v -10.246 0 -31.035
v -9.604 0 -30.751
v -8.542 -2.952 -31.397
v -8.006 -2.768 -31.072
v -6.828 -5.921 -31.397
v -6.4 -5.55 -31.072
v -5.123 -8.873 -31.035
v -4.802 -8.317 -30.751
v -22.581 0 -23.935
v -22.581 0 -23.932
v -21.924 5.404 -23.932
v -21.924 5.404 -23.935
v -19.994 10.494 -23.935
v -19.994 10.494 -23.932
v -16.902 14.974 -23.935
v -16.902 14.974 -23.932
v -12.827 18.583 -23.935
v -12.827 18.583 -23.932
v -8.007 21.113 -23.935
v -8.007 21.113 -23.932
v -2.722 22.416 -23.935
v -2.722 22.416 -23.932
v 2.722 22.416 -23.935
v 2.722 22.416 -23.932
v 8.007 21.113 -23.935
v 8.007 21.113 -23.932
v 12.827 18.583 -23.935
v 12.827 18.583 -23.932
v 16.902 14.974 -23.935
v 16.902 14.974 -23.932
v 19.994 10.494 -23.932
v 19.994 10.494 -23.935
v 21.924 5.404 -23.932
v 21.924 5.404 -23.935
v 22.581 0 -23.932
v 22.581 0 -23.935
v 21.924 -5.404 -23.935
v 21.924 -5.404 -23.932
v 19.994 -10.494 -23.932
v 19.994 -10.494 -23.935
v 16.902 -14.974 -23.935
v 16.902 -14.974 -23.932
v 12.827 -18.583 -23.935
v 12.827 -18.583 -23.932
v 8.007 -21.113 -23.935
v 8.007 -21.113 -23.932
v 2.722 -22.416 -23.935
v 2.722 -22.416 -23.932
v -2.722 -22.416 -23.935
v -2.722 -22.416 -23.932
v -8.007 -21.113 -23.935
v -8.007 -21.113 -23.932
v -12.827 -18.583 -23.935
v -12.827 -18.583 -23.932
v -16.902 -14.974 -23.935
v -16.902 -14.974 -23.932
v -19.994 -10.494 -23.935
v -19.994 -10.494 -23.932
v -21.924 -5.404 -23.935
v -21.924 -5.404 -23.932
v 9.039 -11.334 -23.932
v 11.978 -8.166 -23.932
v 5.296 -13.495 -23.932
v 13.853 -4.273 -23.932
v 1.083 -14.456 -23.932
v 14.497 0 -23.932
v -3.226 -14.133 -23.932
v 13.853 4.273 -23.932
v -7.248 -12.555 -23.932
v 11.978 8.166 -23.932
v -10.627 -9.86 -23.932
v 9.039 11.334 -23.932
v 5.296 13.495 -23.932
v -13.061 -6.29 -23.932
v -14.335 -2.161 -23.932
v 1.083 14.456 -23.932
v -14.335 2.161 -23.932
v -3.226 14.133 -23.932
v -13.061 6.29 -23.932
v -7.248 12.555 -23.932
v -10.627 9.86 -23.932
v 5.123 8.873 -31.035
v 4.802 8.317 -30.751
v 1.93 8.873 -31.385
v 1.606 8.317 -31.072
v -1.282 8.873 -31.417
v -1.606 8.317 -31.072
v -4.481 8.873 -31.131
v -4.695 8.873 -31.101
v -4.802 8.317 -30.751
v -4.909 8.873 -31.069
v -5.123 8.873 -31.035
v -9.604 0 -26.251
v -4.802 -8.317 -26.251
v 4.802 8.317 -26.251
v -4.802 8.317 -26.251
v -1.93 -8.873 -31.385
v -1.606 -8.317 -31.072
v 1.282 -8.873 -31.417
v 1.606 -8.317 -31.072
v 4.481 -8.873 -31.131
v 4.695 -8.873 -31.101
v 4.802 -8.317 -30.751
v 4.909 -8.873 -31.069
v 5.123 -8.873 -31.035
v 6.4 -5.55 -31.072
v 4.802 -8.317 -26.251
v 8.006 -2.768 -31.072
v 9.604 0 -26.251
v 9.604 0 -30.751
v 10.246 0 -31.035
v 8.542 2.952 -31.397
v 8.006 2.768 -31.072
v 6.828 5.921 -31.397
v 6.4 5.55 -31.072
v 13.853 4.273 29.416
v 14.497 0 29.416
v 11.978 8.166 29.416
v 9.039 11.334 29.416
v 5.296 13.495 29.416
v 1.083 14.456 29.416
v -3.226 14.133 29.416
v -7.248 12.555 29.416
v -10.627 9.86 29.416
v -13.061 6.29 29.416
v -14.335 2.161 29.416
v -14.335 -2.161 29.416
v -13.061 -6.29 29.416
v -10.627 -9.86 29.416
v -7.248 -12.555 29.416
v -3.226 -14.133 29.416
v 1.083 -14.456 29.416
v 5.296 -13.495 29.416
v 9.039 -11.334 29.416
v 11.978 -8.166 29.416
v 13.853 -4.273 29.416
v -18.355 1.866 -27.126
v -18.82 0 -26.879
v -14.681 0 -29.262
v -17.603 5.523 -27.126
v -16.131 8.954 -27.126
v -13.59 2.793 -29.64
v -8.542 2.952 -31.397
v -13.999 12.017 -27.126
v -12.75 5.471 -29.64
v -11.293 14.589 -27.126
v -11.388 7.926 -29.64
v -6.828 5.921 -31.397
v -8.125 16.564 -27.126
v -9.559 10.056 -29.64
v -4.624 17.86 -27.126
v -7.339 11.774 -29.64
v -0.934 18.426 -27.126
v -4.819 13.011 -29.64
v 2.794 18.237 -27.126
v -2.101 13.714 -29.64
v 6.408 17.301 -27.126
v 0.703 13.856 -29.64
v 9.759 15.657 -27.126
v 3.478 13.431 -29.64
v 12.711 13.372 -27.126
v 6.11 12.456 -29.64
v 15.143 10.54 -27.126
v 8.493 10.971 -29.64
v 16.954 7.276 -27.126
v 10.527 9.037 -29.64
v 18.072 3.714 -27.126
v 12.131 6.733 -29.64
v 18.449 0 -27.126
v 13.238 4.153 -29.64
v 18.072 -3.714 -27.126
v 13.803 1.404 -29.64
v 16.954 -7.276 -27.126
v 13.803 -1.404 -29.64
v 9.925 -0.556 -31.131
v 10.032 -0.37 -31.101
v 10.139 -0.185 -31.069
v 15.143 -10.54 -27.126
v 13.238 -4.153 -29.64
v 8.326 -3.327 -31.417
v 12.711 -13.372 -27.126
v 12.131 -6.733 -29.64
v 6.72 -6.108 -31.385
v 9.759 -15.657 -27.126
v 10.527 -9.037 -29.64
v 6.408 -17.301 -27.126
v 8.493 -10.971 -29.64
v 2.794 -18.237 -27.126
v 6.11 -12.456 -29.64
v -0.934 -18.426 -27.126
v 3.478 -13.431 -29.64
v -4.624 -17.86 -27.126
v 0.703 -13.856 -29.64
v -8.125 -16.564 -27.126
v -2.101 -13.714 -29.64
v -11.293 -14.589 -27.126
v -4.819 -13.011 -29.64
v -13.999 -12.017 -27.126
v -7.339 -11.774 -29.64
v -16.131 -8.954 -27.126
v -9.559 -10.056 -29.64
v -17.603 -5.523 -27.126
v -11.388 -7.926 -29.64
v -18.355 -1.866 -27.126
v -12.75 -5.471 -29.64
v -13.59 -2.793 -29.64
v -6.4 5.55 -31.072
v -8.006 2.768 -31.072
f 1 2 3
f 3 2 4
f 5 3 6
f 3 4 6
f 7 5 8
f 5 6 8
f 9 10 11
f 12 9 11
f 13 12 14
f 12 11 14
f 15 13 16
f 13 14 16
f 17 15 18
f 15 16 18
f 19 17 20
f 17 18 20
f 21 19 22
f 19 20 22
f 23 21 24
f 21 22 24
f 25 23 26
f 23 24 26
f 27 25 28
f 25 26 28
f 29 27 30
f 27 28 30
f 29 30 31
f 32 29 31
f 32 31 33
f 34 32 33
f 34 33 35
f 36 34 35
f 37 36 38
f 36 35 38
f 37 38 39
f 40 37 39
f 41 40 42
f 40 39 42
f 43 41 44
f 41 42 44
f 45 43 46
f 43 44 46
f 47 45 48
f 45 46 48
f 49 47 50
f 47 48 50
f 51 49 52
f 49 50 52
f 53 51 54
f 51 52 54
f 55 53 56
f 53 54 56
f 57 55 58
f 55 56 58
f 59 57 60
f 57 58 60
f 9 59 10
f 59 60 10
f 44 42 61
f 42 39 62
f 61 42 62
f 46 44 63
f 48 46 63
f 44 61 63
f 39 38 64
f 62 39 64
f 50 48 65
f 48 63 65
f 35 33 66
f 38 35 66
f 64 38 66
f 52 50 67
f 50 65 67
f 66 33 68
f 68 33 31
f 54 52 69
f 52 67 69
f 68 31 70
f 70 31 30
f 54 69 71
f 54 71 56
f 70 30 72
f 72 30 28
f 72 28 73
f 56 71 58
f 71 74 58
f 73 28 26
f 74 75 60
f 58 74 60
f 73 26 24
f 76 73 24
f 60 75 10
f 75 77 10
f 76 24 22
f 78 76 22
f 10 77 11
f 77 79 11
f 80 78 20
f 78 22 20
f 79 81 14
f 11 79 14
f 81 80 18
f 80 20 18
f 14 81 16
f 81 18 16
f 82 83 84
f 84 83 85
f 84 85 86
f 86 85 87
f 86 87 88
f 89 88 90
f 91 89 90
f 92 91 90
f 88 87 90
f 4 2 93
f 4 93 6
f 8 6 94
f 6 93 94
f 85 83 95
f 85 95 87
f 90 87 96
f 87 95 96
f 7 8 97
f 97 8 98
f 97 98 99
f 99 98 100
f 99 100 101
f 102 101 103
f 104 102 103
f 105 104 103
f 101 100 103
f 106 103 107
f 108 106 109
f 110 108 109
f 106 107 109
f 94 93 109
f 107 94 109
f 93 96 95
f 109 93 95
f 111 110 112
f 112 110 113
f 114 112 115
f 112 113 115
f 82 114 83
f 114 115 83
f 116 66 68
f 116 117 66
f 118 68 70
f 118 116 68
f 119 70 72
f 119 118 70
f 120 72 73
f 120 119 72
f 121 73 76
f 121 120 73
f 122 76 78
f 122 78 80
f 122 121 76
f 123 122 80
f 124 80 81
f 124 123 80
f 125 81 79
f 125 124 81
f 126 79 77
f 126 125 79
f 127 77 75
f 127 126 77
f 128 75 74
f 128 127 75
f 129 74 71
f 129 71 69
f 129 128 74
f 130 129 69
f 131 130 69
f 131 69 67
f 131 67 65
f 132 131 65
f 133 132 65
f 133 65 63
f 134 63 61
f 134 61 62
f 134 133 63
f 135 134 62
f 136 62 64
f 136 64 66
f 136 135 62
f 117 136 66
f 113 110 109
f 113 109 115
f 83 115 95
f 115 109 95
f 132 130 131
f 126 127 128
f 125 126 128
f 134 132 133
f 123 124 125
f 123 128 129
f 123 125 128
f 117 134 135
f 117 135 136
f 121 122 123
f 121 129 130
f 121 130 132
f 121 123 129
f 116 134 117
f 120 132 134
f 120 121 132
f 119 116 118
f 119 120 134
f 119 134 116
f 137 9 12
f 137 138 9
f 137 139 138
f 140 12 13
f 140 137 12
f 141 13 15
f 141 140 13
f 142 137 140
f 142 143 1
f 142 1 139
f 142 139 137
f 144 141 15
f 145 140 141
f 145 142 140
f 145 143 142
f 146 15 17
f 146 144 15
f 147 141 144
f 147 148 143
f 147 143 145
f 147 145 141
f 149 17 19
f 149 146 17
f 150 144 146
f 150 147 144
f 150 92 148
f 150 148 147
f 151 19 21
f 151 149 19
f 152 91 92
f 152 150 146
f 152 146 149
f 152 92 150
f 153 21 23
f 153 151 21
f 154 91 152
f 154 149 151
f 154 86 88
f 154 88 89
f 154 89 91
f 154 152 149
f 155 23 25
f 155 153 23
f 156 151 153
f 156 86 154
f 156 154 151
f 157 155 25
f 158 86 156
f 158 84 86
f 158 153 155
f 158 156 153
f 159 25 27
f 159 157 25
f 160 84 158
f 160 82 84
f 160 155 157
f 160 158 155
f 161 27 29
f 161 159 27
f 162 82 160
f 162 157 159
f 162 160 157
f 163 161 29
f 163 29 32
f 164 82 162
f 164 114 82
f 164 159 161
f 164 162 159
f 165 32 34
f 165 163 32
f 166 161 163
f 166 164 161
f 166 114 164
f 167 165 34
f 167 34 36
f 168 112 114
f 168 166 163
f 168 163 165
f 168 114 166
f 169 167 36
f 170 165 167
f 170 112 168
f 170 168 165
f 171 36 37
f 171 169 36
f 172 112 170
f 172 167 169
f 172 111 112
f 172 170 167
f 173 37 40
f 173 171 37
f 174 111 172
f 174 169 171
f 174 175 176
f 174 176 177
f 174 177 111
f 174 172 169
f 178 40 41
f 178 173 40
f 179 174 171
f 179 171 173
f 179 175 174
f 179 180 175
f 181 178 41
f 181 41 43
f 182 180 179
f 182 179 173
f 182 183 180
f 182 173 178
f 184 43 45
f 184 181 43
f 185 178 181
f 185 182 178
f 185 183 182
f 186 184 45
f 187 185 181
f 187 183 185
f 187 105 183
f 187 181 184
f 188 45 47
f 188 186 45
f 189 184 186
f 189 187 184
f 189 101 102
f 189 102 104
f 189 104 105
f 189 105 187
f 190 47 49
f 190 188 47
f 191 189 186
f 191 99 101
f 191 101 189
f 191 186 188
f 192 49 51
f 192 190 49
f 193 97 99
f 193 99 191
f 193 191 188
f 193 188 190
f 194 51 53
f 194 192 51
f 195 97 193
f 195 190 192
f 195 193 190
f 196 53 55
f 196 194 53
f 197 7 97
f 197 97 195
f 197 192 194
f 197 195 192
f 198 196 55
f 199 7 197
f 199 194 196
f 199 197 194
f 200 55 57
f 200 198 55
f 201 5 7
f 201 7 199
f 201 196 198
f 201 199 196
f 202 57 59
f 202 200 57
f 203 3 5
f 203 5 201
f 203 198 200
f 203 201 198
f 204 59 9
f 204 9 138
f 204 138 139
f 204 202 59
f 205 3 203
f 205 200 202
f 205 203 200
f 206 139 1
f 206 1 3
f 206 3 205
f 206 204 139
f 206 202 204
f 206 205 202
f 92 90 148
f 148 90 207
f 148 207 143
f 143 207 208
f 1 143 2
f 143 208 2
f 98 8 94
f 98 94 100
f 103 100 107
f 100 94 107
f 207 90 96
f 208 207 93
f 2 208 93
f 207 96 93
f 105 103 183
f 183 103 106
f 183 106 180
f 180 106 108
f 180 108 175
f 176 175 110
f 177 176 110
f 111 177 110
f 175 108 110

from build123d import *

# Parameters (mm, degrees)
SKETCH1_R           = 5
BOSS_EXTRUDE1_DEPTH = 9.2
SKETCH2_R           = 7.788167924
BOSS_EXTRUDE2_DEPTH = 0.001
DOME1_FACE_RADIUS   = 7.788167924
DOME1_HEIGHT        = 3
CUT_EXTRUDE1_START  = -10
CUT_EXTRUDE1_DEPTH  = 40
CHAMFER2_SIZE       = 0.16446068
SCALE1_SCALE        = 1.9329
SCALE2_SCALE        = 1.5


with BuildPart() as part:
    # Sketch1 → Boss-Extrude1 (new, symmetric)
    with BuildSketch(Plane.XY):
        Circle(SKETCH1_R)
    extrude(amount=BOSS_EXTRUDE1_DEPTH, both=True)

    # Sketch2 → Boss-Extrude2 (add)
    with BuildSketch(Plane(origin=(0, 0, -9.2), x_dir=(-1, 0, 0), z_dir=(0, 0, -1))):
        Circle(SKETCH2_R)
    extrude(amount=BOSS_EXTRUDE2_DEPTH)

    # Dome1: a dome of height H over a round flat face of radius A is a cap of a sphere of radius (A * A + H * H) / (2 * H)
    dome1_r = (DOME1_FACE_RADIUS * DOME1_FACE_RADIUS + DOME1_HEIGHT * DOME1_HEIGHT) / (2 * DOME1_HEIGHT)
    dome1_base = Plane((0, 0, -9.201), z_dir=(0, 0, -1))
    with Locations(dome1_base.offset(DOME1_HEIGHT - dome1_r)):
        dome1_ball = Sphere(dome1_r, mode=Mode.PRIVATE)
    add(split(dome1_ball, bisect_by=dome1_base, keep=Keep.TOP, mode=Mode.PRIVATE))

    # Sketch3 → Cut-Extrude1 (cut)
    with BuildSketch(Plane.XY.offset(CUT_EXTRUDE1_START)):
        Polygon((-3.312540498, 0), (-1.656270249, -2.868744223), (1.656270249, -2.868744223), (3.312540498, 0), (1.656270249, 2.868744223), (-1.656270249, 2.868744223), align=None)
    extrude(amount=-CUT_EXTRUDE1_DEPTH, mode=Mode.SUBTRACT)

    # Chamfer2
    # the kernel refuses this chamfer: 0.2, 0.16446068 mm, written as the material it takes off along each edge
    with BuildSketch(Plane(origin=(-2.484405374, -1.434372111, -0.591740065), x_dir=(-0.09595536386249687, 0.16619956546860265, -0.9814123866061929), z_dir=(-0.49070619330309756, 0.8499280583896772, 0.1919107277249933))) as chamfer2_piece_1_section:
        with BuildLine():
            Line((11.198587704, 0.191737716), (11.2492321 - CHAMFER2_SIZE, 0))
            Line((11.2492321 - CHAMFER2_SIZE, 0), (11.2492321, 0))
            ThreePointArc((11.2492321, 0), (11.223603032, 0.098687532), (11.198587704, 0.191737716))
        make_face()
    chamfer2_piece_1 = revolve(axis=Axis((-2.484405374, -1.434372111, -0.591740065), (-0.866025403784438, -0.5000000000000011, 0)), revolution_arc=22.128626255, mode=Mode.PRIVATE)
    chamfer2_piece_1 = split(chamfer2_piece_1, bisect_by=Plane(origin=(-3.726608061, -0.717186056, -0.591740065), z_dir=(0.8660254037844416, -0.499999999999995, 0)), keep=Keep.TOP, mode=Mode.PRIVATE)
    chamfer2_piece_1 = split(chamfer2_piece_1, bisect_by=Plane(origin=(-2.484405374, -2.868744223, -0.591740065), z_dir=(0, 1, 0)), keep=Keep.TOP, mode=Mode.PRIVATE)
    add(chamfer2_piece_1, mode=Mode.SUBTRACT)
    with BuildSketch(Plane(origin=(0, -2.868744223, -0.591740065), x_dir=(-0.1919107277249941, 0, -0.9814123866061928), z_dir=(-0.9814123866061928, -3.420849025073354e-15, 0.1919107277249941))) as chamfer2_piece_2_section:
        with BuildLine():
            Line((11.198587704, 0.191737716), (11.2492321 - CHAMFER2_SIZE, 0))
            Line((11.2492321 - CHAMFER2_SIZE, 0), (11.2492321, 0))
            ThreePointArc((11.2492321, 0), (11.223603032, 0.098687532), (11.198587704, 0.191737716))
        make_face()
    chamfer2_piece_2 = revolve(axis=Axis((0, -2.868744223, -0.591740065), (0, -1, 0)), revolution_arc=22.128626255, mode=Mode.PRIVATE)
    chamfer2_piece_2 = split(chamfer2_piece_2, bisect_by=Plane(origin=(1.242202687, -3.585930278, -0.591740065), z_dir=(-0.8660254037844415, 0.49999999999999506, 0)), keep=Keep.TOP, mode=Mode.PRIVATE)
    chamfer2_piece_2 = split(chamfer2_piece_2, bisect_by=Plane(origin=(-1.242202687, -3.585930278, -0.591740065), z_dir=(0.866025403784438, 0.5000000000000011, 0)), keep=Keep.TOP, mode=Mode.PRIVATE)
    add(chamfer2_piece_2, mode=Mode.SUBTRACT)
    with BuildSketch(Plane(origin=(2.484405374, -1.434372111, -0.591740065), x_dir=(-0.09595536386249569, -0.16619956546860332, -0.9814123866061929), z_dir=(-0.4907061933030916, -0.8499280583896806, 0.1919107277249933))) as chamfer2_piece_3_section:
        with BuildLine():
            Line((11.198587704, 0.191737716), (11.2492321 - CHAMFER2_SIZE, 0))
            Line((11.2492321 - CHAMFER2_SIZE, 0), (11.2492321, 0))
            ThreePointArc((11.2492321, 0), (11.223603032, 0.098687532), (11.198587704, 0.191737716))
        make_face()
    chamfer2_piece_3 = revolve(axis=Axis((2.484405374, -1.434372111, -0.591740065), (0.8660254037844415, -0.49999999999999506, 0)), revolution_arc=22.128626255, mode=Mode.PRIVATE)
    chamfer2_piece_3 = split(chamfer2_piece_3, bisect_by=Plane(origin=(3.726608061, -0.717186056, -0.591740065), z_dir=(-0.8660254037844346, -0.5000000000000072, 0)), keep=Keep.TOP, mode=Mode.PRIVATE)
    chamfer2_piece_3 = split(chamfer2_piece_3, bisect_by=Plane(origin=(2.484405374, -2.868744223, -0.591740065), z_dir=(0, 1, 0)), keep=Keep.TOP, mode=Mode.PRIVATE)
    add(chamfer2_piece_3, mode=Mode.SUBTRACT)
    with BuildSketch(Plane(origin=(2.484405374, 1.434372111, -0.591740065), x_dir=(0.09595536386249802, -0.16619956546860198, -0.9814123866061929), z_dir=(0.49070619330310355, -0.8499280583896739, 0.19191072772499332))) as chamfer2_piece_4_section:
        with BuildLine():
            Line((11.198587704, 0.191737716), (11.2492321 - CHAMFER2_SIZE, 0))
            Line((11.2492321 - CHAMFER2_SIZE, 0), (11.2492321, 0))
            ThreePointArc((11.2492321, 0), (11.223603032, 0.098687532), (11.198587704, 0.191737716))
        make_face()
    chamfer2_piece_4 = revolve(axis=Axis((2.484405374, 1.434372111, -0.591740065), (0.8660254037844346, 0.5000000000000072, 0)), revolution_arc=22.128626255, mode=Mode.PRIVATE)
    chamfer2_piece_4 = split(chamfer2_piece_4, bisect_by=Plane(origin=(2.484405374, 2.868744223, -0.591740065), z_dir=(0, -1, 0)), keep=Keep.TOP, mode=Mode.PRIVATE)
    chamfer2_piece_4 = split(chamfer2_piece_4, bisect_by=Plane(origin=(3.726608061, 0.717186056, -0.591740065), z_dir=(-0.8660254037844415, 0.49999999999999506, 0)), keep=Keep.TOP, mode=Mode.PRIVATE)
    add(chamfer2_piece_4, mode=Mode.SUBTRACT)
    with BuildSketch(Plane(origin=(0, 2.868744223, -0.591740065), x_dir=(0.1919107277249941, 1.9738645532128006e-15, -0.9814123866061928), z_dir=(0.9814123866061928, 1.0130975958871086e-14, 0.1919107277249941))) as chamfer2_piece_5_section:
        with BuildLine():
            Line((11.198587704, 0.191737716), (11.2492321 - CHAMFER2_SIZE, 0))
            Line((11.2492321 - CHAMFER2_SIZE, 0), (11.2492321, 0))
            ThreePointArc((11.2492321, 0), (11.223603032, 0.098687532), (11.198587704, 0.191737716))
        make_face()
    chamfer2_piece_5 = revolve(axis=Axis((0, 2.868744223, -0.591740065), (0, 1, 0)), revolution_arc=22.128626255, mode=Mode.PRIVATE)
    chamfer2_piece_5 = split(chamfer2_piece_5, bisect_by=Plane(origin=(-1.242202687, 3.585930278, -0.591740065), z_dir=(0.8660254037844416, -0.499999999999995, 0)), keep=Keep.TOP, mode=Mode.PRIVATE)
    chamfer2_piece_5 = split(chamfer2_piece_5, bisect_by=Plane(origin=(1.242202687, 3.585930278, -0.591740065), z_dir=(-0.8660254037844346, -0.5000000000000072, 0)), keep=Keep.TOP, mode=Mode.PRIVATE)
    add(chamfer2_piece_5, mode=Mode.SUBTRACT)
    with BuildSketch(Plane(origin=(-2.484405374, 1.434372111, -0.591740065), x_dir=(0.09595536386249523, 0.16619956546860257, -0.981412386606193), z_dir=(0.4907061933030916, 0.8499280583896808, 0.1919107277249924))) as chamfer2_piece_6_section:
        with BuildLine():
            Line((11.198587704, 0.191737716), (11.2492321 - CHAMFER2_SIZE, 0))
            Line((11.2492321 - CHAMFER2_SIZE, 0), (11.2492321, 0))
            ThreePointArc((11.2492321, 0), (11.223603032, 0.098687532), (11.198587704, 0.191737716))
        make_face()
    chamfer2_piece_6 = revolve(axis=Axis((-2.484405374, 1.434372111, -0.591740065), (-0.8660254037844416, 0.499999999999995, 0)), revolution_arc=22.128626255, mode=Mode.PRIVATE)
    chamfer2_piece_6 = split(chamfer2_piece_6, bisect_by=Plane(origin=(-2.484405374, 2.868744223, -0.591740065), z_dir=(0, -1, 0)), keep=Keep.TOP, mode=Mode.PRIVATE)
    chamfer2_piece_6 = split(chamfer2_piece_6, bisect_by=Plane(origin=(-3.726608061, 0.717186056, -0.591740065), z_dir=(0.866025403784438, 0.5000000000000011, 0)), keep=Keep.TOP, mode=Mode.PRIVATE)
    add(chamfer2_piece_6, mode=Mode.SUBTRACT)
    with BuildSketch(Plane(origin=(-2.484405374, 1.434372111, -0.591740065), x_dir=(0.09595536386249523, 0.16619956546860257, -0.981412386606193), z_dir=(0.4907061933030916, 0.8499280583896808, 0.1919107277249924))) as chamfer2_piece_7a_section:
        with BuildLine():
            Line((11.198587704, 0.191737716), (11.2492321 - CHAMFER2_SIZE, 0))
            Line((11.2492321 - CHAMFER2_SIZE, 0), (11.2492321, 0))
            ThreePointArc((11.2492321, 0), (11.223603032, 0.098687532), (11.198587704, 0.191737716))
        make_face()
    chamfer2_piece_7a = revolve(axis=Axis((-2.484405374, 1.434372111, -0.591740065), (-0.8660254037844416, 0.499999999999995, 0)), revolution_arc=22.128626255, mode=Mode.PRIVATE)
    chamfer2_piece_7a = split(chamfer2_piece_7a, bisect_by=Plane(origin=(-3.726608061, 0.717186056, -0.591740065), z_dir=(-0.866025403784438, -0.5000000000000011, 0)), keep=Keep.TOP, mode=Mode.PRIVATE)
    with BuildSketch(Plane(origin=(-2.484405374, -1.434372111, -0.591740065), x_dir=(-0.09595536386249687, 0.16619956546860265, -0.9814123866061929), z_dir=(-0.49070619330309756, 0.8499280583896772, 0.1919107277249933))) as chamfer2_piece_7b_section:
        with BuildLine():
            Line((11.198587704, 0.191737716), (11.2492321 - CHAMFER2_SIZE, 0))
            Line((11.2492321 - CHAMFER2_SIZE, 0), (11.2492321, 0))
            ThreePointArc((11.2492321, 0), (11.223603032, 0.098687532), (11.198587704, 0.191737716))
        make_face()
    chamfer2_piece_7b = revolve(axis=Axis((-2.484405374, -1.434372111, -0.591740065), (-0.866025403784438, -0.5000000000000011, 0)), revolution_arc=22.128626255, mode=Mode.PRIVATE)
    chamfer2_piece_7b = split(chamfer2_piece_7b, bisect_by=Plane(origin=(-3.726608061, -0.717186056, -0.591740065), z_dir=(-0.8660254037844416, 0.499999999999995, 0)), keep=Keep.TOP, mode=Mode.PRIVATE)
    chamfer2_piece_7 = chamfer2_piece_7a & chamfer2_piece_7b
    add(chamfer2_piece_7, mode=Mode.SUBTRACT)
    with BuildSketch(Plane(origin=(0, -2.868744223, -0.591740065), x_dir=(-0.1919107277249941, 0, -0.9814123866061928), z_dir=(-0.9814123866061928, -3.420849025073354e-15, 0.1919107277249941))) as chamfer2_piece_8a_section:
        with BuildLine():
            Line((11.198587704, 0.191737716), (11.2492321 - CHAMFER2_SIZE, 0))
            Line((11.2492321 - CHAMFER2_SIZE, 0), (11.2492321, 0))
            ThreePointArc((11.2492321, 0), (11.223603032, 0.098687532), (11.198587704, 0.191737716))
        make_face()
    chamfer2_piece_8a = revolve(axis=Axis((0, -2.868744223, -0.591740065), (0, -1, 0)), revolution_arc=22.128626255, mode=Mode.PRIVATE)
    chamfer2_piece_8a = split(chamfer2_piece_8a, bisect_by=Plane(origin=(-1.242202687, -3.585930278, -0.591740065), z_dir=(-0.866025403784438, -0.5000000000000011, 0)), keep=Keep.TOP, mode=Mode.PRIVATE)
    with BuildSketch(Plane(origin=(-2.484405374, -1.434372111, -0.591740065), x_dir=(-0.09595536386249687, 0.16619956546860265, -0.9814123866061929), z_dir=(-0.49070619330309756, 0.8499280583896772, 0.1919107277249933))) as chamfer2_piece_8b_section:
        with BuildLine():
            Line((11.198587704, 0.191737716), (11.2492321 - CHAMFER2_SIZE, 0))
            Line((11.2492321 - CHAMFER2_SIZE, 0), (11.2492321, 0))
            ThreePointArc((11.2492321, 0), (11.223603032, 0.098687532), (11.198587704, 0.191737716))
        make_face()
    chamfer2_piece_8b = revolve(axis=Axis((-2.484405374, -1.434372111, -0.591740065), (-0.866025403784438, -0.5000000000000011, 0)), revolution_arc=22.128626255, mode=Mode.PRIVATE)
    chamfer2_piece_8b = split(chamfer2_piece_8b, bisect_by=Plane(origin=(-2.484405374, -2.868744223, -0.591740065), z_dir=(0, -1, 0)), keep=Keep.TOP, mode=Mode.PRIVATE)
    chamfer2_piece_8 = chamfer2_piece_8a & chamfer2_piece_8b
    add(chamfer2_piece_8, mode=Mode.SUBTRACT)
    with BuildSketch(Plane(origin=(2.484405374, -1.434372111, -0.591740065), x_dir=(-0.09595536386249569, -0.16619956546860332, -0.9814123866061929), z_dir=(-0.4907061933030916, -0.8499280583896806, 0.1919107277249933))) as chamfer2_piece_9a_section:
        with BuildLine():
            Line((11.198587704, 0.191737716), (11.2492321 - CHAMFER2_SIZE, 0))
            Line((11.2492321 - CHAMFER2_SIZE, 0), (11.2492321, 0))
            ThreePointArc((11.2492321, 0), (11.223603032, 0.098687532), (11.198587704, 0.191737716))
        make_face()
    chamfer2_piece_9a = revolve(axis=Axis((2.484405374, -1.434372111, -0.591740065), (0.8660254037844415, -0.49999999999999506, 0)), revolution_arc=22.128626255, mode=Mode.PRIVATE)
    chamfer2_piece_9a = split(chamfer2_piece_9a, bisect_by=Plane(origin=(2.484405374, -2.868744223, -0.591740065), z_dir=(0, -1, 0)), keep=Keep.TOP, mode=Mode.PRIVATE)
    with BuildSketch(Plane(origin=(0, -2.868744223, -0.591740065), x_dir=(-0.1919107277249941, 0, -0.9814123866061928), z_dir=(-0.9814123866061928, -3.420849025073354e-15, 0.1919107277249941))) as chamfer2_piece_9b_section:
        with BuildLine():
            Line((11.198587704, 0.191737716), (11.2492321 - CHAMFER2_SIZE, 0))
            Line((11.2492321 - CHAMFER2_SIZE, 0), (11.2492321, 0))
            ThreePointArc((11.2492321, 0), (11.223603032, 0.098687532), (11.198587704, 0.191737716))
        make_face()
    chamfer2_piece_9b = revolve(axis=Axis((0, -2.868744223, -0.591740065), (0, -1, 0)), revolution_arc=22.128626255, mode=Mode.PRIVATE)
    chamfer2_piece_9b = split(chamfer2_piece_9b, bisect_by=Plane(origin=(1.242202687, -3.585930278, -0.591740065), z_dir=(0.8660254037844415, -0.49999999999999506, 0)), keep=Keep.TOP, mode=Mode.PRIVATE)
    chamfer2_piece_9 = chamfer2_piece_9a & chamfer2_piece_9b
    add(chamfer2_piece_9, mode=Mode.SUBTRACT)
    with BuildSketch(Plane(origin=(2.484405374, 1.434372111, -0.591740065), x_dir=(0.09595536386249802, -0.16619956546860198, -0.9814123866061929), z_dir=(0.49070619330310355, -0.8499280583896739, 0.19191072772499332))) as chamfer2_piece_10a_section:
        with BuildLine():
            Line((11.198587704, 0.191737716), (11.2492321 - CHAMFER2_SIZE, 0))
            Line((11.2492321 - CHAMFER2_SIZE, 0), (11.2492321, 0))
            ThreePointArc((11.2492321, 0), (11.223603032, 0.098687532), (11.198587704, 0.191737716))
        make_face()
    chamfer2_piece_10a = revolve(axis=Axis((2.484405374, 1.434372111, -0.591740065), (0.8660254037844346, 0.5000000000000072, 0)), revolution_arc=22.128626255, mode=Mode.PRIVATE)
    chamfer2_piece_10a = split(chamfer2_piece_10a, bisect_by=Plane(origin=(3.726608061, 0.717186056, -0.591740065), z_dir=(0.8660254037844415, -0.49999999999999506, 0)), keep=Keep.TOP, mode=Mode.PRIVATE)
    with BuildSketch(Plane(origin=(2.484405374, -1.434372111, -0.591740065), x_dir=(-0.09595536386249569, -0.16619956546860332, -0.9814123866061929), z_dir=(-0.4907061933030916, -0.8499280583896806, 0.1919107277249933))) as chamfer2_piece_10b_section:
        with BuildLine():
            Line((11.198587704, 0.191737716), (11.2492321 - CHAMFER2_SIZE, 0))
            Line((11.2492321 - CHAMFER2_SIZE, 0), (11.2492321, 0))
            ThreePointArc((11.2492321, 0), (11.223603032, 0.098687532), (11.198587704, 0.191737716))
        make_face()
    chamfer2_piece_10b = revolve(axis=Axis((2.484405374, -1.434372111, -0.591740065), (0.8660254037844415, -0.49999999999999506, 0)), revolution_arc=22.128626255, mode=Mode.PRIVATE)
    chamfer2_piece_10b = split(chamfer2_piece_10b, bisect_by=Plane(origin=(3.726608061, -0.717186056, -0.591740065), z_dir=(0.8660254037844346, 0.5000000000000072, 0)), keep=Keep.TOP, mode=Mode.PRIVATE)
    chamfer2_piece_10 = chamfer2_piece_10a & chamfer2_piece_10b
    add(chamfer2_piece_10, mode=Mode.SUBTRACT)
    with BuildSketch(Plane(origin=(0, 2.868744223, -0.591740065), x_dir=(0.1919107277249941, 1.9738645532128006e-15, -0.9814123866061928), z_dir=(0.9814123866061928, 1.0130975958871086e-14, 0.1919107277249941))) as chamfer2_piece_11a_section:
        with BuildLine():
            Line((11.198587704, 0.191737716), (11.2492321 - CHAMFER2_SIZE, 0))
            Line((11.2492321 - CHAMFER2_SIZE, 0), (11.2492321, 0))
            ThreePointArc((11.2492321, 0), (11.223603032, 0.098687532), (11.198587704, 0.191737716))
        make_face()
    chamfer2_piece_11a = revolve(axis=Axis((0, 2.868744223, -0.591740065), (0, 1, 0)), revolution_arc=22.128626255, mode=Mode.PRIVATE)
    chamfer2_piece_11a = split(chamfer2_piece_11a, bisect_by=Plane(origin=(1.242202687, 3.585930278, -0.591740065), z_dir=(0.8660254037844346, 0.5000000000000072, 0)), keep=Keep.TOP, mode=Mode.PRIVATE)
    with BuildSketch(Plane(origin=(2.484405374, 1.434372111, -0.591740065), x_dir=(0.09595536386249802, -0.16619956546860198, -0.9814123866061929), z_dir=(0.49070619330310355, -0.8499280583896739, 0.19191072772499332))) as chamfer2_piece_11b_section:
        with BuildLine():
            Line((11.198587704, 0.191737716), (11.2492321 - CHAMFER2_SIZE, 0))
            Line((11.2492321 - CHAMFER2_SIZE, 0), (11.2492321, 0))
            ThreePointArc((11.2492321, 0), (11.223603032, 0.098687532), (11.198587704, 0.191737716))
        make_face()
    chamfer2_piece_11b = revolve(axis=Axis((2.484405374, 1.434372111, -0.591740065), (0.8660254037844346, 0.5000000000000072, 0)), revolution_arc=22.128626255, mode=Mode.PRIVATE)
    chamfer2_piece_11b = split(chamfer2_piece_11b, bisect_by=Plane(origin=(2.484405374, 2.868744223, -0.591740065), z_dir=(0, 1, 0)), keep=Keep.TOP, mode=Mode.PRIVATE)
    chamfer2_piece_11 = chamfer2_piece_11a & chamfer2_piece_11b
    add(chamfer2_piece_11, mode=Mode.SUBTRACT)
    with BuildSketch(Plane(origin=(-2.484405374, 1.434372111, -0.591740065), x_dir=(0.09595536386249523, 0.16619956546860257, -0.981412386606193), z_dir=(0.4907061933030916, 0.8499280583896808, 0.1919107277249924))) as chamfer2_piece_12a_section:
        with BuildLine():
            Line((11.198587704, 0.191737716), (11.2492321 - CHAMFER2_SIZE, 0))
            Line((11.2492321 - CHAMFER2_SIZE, 0), (11.2492321, 0))
            ThreePointArc((11.2492321, 0), (11.223603032, 0.098687532), (11.198587704, 0.191737716))
        make_face()
    chamfer2_piece_12a = revolve(axis=Axis((-2.484405374, 1.434372111, -0.591740065), (-0.8660254037844416, 0.499999999999995, 0)), revolution_arc=22.128626255, mode=Mode.PRIVATE)
    chamfer2_piece_12a = split(chamfer2_piece_12a, bisect_by=Plane(origin=(-2.484405374, 2.868744223, -0.591740065), z_dir=(0, 1, 0)), keep=Keep.TOP, mode=Mode.PRIVATE)
    with BuildSketch(Plane(origin=(0, 2.868744223, -0.591740065), x_dir=(0.1919107277249941, 1.9738645532128006e-15, -0.9814123866061928), z_dir=(0.9814123866061928, 1.0130975958871086e-14, 0.1919107277249941))) as chamfer2_piece_12b_section:
        with BuildLine():
            Line((11.198587704, 0.191737716), (11.2492321 - CHAMFER2_SIZE, 0))
            Line((11.2492321 - CHAMFER2_SIZE, 0), (11.2492321, 0))
            ThreePointArc((11.2492321, 0), (11.223603032, 0.098687532), (11.198587704, 0.191737716))
        make_face()
    chamfer2_piece_12b = revolve(axis=Axis((0, 2.868744223, -0.591740065), (0, 1, 0)), revolution_arc=22.128626255, mode=Mode.PRIVATE)
    chamfer2_piece_12b = split(chamfer2_piece_12b, bisect_by=Plane(origin=(-1.242202687, 3.585930278, -0.591740065), z_dir=(-0.8660254037844416, 0.499999999999995, 0)), keep=Keep.TOP, mode=Mode.PRIVATE)
    chamfer2_piece_12 = chamfer2_piece_12a & chamfer2_piece_12b
    add(chamfer2_piece_12, mode=Mode.SUBTRACT)


with BuildPart() as part_1:
    # Scale1: scaled about (0, 0, -1.443824767)
    add(part.part.scale(SCALE1_SCALE).moved(Location((0, 0, 1.346944125))))


with BuildPart() as part_2:
    # Scale2: scaled about (0, 0, -1.443824767)
    add(part_1.part.scale(SCALE2_SCALE).moved(Location((0, 0, 0.721912383))))


solid = part_2.part
